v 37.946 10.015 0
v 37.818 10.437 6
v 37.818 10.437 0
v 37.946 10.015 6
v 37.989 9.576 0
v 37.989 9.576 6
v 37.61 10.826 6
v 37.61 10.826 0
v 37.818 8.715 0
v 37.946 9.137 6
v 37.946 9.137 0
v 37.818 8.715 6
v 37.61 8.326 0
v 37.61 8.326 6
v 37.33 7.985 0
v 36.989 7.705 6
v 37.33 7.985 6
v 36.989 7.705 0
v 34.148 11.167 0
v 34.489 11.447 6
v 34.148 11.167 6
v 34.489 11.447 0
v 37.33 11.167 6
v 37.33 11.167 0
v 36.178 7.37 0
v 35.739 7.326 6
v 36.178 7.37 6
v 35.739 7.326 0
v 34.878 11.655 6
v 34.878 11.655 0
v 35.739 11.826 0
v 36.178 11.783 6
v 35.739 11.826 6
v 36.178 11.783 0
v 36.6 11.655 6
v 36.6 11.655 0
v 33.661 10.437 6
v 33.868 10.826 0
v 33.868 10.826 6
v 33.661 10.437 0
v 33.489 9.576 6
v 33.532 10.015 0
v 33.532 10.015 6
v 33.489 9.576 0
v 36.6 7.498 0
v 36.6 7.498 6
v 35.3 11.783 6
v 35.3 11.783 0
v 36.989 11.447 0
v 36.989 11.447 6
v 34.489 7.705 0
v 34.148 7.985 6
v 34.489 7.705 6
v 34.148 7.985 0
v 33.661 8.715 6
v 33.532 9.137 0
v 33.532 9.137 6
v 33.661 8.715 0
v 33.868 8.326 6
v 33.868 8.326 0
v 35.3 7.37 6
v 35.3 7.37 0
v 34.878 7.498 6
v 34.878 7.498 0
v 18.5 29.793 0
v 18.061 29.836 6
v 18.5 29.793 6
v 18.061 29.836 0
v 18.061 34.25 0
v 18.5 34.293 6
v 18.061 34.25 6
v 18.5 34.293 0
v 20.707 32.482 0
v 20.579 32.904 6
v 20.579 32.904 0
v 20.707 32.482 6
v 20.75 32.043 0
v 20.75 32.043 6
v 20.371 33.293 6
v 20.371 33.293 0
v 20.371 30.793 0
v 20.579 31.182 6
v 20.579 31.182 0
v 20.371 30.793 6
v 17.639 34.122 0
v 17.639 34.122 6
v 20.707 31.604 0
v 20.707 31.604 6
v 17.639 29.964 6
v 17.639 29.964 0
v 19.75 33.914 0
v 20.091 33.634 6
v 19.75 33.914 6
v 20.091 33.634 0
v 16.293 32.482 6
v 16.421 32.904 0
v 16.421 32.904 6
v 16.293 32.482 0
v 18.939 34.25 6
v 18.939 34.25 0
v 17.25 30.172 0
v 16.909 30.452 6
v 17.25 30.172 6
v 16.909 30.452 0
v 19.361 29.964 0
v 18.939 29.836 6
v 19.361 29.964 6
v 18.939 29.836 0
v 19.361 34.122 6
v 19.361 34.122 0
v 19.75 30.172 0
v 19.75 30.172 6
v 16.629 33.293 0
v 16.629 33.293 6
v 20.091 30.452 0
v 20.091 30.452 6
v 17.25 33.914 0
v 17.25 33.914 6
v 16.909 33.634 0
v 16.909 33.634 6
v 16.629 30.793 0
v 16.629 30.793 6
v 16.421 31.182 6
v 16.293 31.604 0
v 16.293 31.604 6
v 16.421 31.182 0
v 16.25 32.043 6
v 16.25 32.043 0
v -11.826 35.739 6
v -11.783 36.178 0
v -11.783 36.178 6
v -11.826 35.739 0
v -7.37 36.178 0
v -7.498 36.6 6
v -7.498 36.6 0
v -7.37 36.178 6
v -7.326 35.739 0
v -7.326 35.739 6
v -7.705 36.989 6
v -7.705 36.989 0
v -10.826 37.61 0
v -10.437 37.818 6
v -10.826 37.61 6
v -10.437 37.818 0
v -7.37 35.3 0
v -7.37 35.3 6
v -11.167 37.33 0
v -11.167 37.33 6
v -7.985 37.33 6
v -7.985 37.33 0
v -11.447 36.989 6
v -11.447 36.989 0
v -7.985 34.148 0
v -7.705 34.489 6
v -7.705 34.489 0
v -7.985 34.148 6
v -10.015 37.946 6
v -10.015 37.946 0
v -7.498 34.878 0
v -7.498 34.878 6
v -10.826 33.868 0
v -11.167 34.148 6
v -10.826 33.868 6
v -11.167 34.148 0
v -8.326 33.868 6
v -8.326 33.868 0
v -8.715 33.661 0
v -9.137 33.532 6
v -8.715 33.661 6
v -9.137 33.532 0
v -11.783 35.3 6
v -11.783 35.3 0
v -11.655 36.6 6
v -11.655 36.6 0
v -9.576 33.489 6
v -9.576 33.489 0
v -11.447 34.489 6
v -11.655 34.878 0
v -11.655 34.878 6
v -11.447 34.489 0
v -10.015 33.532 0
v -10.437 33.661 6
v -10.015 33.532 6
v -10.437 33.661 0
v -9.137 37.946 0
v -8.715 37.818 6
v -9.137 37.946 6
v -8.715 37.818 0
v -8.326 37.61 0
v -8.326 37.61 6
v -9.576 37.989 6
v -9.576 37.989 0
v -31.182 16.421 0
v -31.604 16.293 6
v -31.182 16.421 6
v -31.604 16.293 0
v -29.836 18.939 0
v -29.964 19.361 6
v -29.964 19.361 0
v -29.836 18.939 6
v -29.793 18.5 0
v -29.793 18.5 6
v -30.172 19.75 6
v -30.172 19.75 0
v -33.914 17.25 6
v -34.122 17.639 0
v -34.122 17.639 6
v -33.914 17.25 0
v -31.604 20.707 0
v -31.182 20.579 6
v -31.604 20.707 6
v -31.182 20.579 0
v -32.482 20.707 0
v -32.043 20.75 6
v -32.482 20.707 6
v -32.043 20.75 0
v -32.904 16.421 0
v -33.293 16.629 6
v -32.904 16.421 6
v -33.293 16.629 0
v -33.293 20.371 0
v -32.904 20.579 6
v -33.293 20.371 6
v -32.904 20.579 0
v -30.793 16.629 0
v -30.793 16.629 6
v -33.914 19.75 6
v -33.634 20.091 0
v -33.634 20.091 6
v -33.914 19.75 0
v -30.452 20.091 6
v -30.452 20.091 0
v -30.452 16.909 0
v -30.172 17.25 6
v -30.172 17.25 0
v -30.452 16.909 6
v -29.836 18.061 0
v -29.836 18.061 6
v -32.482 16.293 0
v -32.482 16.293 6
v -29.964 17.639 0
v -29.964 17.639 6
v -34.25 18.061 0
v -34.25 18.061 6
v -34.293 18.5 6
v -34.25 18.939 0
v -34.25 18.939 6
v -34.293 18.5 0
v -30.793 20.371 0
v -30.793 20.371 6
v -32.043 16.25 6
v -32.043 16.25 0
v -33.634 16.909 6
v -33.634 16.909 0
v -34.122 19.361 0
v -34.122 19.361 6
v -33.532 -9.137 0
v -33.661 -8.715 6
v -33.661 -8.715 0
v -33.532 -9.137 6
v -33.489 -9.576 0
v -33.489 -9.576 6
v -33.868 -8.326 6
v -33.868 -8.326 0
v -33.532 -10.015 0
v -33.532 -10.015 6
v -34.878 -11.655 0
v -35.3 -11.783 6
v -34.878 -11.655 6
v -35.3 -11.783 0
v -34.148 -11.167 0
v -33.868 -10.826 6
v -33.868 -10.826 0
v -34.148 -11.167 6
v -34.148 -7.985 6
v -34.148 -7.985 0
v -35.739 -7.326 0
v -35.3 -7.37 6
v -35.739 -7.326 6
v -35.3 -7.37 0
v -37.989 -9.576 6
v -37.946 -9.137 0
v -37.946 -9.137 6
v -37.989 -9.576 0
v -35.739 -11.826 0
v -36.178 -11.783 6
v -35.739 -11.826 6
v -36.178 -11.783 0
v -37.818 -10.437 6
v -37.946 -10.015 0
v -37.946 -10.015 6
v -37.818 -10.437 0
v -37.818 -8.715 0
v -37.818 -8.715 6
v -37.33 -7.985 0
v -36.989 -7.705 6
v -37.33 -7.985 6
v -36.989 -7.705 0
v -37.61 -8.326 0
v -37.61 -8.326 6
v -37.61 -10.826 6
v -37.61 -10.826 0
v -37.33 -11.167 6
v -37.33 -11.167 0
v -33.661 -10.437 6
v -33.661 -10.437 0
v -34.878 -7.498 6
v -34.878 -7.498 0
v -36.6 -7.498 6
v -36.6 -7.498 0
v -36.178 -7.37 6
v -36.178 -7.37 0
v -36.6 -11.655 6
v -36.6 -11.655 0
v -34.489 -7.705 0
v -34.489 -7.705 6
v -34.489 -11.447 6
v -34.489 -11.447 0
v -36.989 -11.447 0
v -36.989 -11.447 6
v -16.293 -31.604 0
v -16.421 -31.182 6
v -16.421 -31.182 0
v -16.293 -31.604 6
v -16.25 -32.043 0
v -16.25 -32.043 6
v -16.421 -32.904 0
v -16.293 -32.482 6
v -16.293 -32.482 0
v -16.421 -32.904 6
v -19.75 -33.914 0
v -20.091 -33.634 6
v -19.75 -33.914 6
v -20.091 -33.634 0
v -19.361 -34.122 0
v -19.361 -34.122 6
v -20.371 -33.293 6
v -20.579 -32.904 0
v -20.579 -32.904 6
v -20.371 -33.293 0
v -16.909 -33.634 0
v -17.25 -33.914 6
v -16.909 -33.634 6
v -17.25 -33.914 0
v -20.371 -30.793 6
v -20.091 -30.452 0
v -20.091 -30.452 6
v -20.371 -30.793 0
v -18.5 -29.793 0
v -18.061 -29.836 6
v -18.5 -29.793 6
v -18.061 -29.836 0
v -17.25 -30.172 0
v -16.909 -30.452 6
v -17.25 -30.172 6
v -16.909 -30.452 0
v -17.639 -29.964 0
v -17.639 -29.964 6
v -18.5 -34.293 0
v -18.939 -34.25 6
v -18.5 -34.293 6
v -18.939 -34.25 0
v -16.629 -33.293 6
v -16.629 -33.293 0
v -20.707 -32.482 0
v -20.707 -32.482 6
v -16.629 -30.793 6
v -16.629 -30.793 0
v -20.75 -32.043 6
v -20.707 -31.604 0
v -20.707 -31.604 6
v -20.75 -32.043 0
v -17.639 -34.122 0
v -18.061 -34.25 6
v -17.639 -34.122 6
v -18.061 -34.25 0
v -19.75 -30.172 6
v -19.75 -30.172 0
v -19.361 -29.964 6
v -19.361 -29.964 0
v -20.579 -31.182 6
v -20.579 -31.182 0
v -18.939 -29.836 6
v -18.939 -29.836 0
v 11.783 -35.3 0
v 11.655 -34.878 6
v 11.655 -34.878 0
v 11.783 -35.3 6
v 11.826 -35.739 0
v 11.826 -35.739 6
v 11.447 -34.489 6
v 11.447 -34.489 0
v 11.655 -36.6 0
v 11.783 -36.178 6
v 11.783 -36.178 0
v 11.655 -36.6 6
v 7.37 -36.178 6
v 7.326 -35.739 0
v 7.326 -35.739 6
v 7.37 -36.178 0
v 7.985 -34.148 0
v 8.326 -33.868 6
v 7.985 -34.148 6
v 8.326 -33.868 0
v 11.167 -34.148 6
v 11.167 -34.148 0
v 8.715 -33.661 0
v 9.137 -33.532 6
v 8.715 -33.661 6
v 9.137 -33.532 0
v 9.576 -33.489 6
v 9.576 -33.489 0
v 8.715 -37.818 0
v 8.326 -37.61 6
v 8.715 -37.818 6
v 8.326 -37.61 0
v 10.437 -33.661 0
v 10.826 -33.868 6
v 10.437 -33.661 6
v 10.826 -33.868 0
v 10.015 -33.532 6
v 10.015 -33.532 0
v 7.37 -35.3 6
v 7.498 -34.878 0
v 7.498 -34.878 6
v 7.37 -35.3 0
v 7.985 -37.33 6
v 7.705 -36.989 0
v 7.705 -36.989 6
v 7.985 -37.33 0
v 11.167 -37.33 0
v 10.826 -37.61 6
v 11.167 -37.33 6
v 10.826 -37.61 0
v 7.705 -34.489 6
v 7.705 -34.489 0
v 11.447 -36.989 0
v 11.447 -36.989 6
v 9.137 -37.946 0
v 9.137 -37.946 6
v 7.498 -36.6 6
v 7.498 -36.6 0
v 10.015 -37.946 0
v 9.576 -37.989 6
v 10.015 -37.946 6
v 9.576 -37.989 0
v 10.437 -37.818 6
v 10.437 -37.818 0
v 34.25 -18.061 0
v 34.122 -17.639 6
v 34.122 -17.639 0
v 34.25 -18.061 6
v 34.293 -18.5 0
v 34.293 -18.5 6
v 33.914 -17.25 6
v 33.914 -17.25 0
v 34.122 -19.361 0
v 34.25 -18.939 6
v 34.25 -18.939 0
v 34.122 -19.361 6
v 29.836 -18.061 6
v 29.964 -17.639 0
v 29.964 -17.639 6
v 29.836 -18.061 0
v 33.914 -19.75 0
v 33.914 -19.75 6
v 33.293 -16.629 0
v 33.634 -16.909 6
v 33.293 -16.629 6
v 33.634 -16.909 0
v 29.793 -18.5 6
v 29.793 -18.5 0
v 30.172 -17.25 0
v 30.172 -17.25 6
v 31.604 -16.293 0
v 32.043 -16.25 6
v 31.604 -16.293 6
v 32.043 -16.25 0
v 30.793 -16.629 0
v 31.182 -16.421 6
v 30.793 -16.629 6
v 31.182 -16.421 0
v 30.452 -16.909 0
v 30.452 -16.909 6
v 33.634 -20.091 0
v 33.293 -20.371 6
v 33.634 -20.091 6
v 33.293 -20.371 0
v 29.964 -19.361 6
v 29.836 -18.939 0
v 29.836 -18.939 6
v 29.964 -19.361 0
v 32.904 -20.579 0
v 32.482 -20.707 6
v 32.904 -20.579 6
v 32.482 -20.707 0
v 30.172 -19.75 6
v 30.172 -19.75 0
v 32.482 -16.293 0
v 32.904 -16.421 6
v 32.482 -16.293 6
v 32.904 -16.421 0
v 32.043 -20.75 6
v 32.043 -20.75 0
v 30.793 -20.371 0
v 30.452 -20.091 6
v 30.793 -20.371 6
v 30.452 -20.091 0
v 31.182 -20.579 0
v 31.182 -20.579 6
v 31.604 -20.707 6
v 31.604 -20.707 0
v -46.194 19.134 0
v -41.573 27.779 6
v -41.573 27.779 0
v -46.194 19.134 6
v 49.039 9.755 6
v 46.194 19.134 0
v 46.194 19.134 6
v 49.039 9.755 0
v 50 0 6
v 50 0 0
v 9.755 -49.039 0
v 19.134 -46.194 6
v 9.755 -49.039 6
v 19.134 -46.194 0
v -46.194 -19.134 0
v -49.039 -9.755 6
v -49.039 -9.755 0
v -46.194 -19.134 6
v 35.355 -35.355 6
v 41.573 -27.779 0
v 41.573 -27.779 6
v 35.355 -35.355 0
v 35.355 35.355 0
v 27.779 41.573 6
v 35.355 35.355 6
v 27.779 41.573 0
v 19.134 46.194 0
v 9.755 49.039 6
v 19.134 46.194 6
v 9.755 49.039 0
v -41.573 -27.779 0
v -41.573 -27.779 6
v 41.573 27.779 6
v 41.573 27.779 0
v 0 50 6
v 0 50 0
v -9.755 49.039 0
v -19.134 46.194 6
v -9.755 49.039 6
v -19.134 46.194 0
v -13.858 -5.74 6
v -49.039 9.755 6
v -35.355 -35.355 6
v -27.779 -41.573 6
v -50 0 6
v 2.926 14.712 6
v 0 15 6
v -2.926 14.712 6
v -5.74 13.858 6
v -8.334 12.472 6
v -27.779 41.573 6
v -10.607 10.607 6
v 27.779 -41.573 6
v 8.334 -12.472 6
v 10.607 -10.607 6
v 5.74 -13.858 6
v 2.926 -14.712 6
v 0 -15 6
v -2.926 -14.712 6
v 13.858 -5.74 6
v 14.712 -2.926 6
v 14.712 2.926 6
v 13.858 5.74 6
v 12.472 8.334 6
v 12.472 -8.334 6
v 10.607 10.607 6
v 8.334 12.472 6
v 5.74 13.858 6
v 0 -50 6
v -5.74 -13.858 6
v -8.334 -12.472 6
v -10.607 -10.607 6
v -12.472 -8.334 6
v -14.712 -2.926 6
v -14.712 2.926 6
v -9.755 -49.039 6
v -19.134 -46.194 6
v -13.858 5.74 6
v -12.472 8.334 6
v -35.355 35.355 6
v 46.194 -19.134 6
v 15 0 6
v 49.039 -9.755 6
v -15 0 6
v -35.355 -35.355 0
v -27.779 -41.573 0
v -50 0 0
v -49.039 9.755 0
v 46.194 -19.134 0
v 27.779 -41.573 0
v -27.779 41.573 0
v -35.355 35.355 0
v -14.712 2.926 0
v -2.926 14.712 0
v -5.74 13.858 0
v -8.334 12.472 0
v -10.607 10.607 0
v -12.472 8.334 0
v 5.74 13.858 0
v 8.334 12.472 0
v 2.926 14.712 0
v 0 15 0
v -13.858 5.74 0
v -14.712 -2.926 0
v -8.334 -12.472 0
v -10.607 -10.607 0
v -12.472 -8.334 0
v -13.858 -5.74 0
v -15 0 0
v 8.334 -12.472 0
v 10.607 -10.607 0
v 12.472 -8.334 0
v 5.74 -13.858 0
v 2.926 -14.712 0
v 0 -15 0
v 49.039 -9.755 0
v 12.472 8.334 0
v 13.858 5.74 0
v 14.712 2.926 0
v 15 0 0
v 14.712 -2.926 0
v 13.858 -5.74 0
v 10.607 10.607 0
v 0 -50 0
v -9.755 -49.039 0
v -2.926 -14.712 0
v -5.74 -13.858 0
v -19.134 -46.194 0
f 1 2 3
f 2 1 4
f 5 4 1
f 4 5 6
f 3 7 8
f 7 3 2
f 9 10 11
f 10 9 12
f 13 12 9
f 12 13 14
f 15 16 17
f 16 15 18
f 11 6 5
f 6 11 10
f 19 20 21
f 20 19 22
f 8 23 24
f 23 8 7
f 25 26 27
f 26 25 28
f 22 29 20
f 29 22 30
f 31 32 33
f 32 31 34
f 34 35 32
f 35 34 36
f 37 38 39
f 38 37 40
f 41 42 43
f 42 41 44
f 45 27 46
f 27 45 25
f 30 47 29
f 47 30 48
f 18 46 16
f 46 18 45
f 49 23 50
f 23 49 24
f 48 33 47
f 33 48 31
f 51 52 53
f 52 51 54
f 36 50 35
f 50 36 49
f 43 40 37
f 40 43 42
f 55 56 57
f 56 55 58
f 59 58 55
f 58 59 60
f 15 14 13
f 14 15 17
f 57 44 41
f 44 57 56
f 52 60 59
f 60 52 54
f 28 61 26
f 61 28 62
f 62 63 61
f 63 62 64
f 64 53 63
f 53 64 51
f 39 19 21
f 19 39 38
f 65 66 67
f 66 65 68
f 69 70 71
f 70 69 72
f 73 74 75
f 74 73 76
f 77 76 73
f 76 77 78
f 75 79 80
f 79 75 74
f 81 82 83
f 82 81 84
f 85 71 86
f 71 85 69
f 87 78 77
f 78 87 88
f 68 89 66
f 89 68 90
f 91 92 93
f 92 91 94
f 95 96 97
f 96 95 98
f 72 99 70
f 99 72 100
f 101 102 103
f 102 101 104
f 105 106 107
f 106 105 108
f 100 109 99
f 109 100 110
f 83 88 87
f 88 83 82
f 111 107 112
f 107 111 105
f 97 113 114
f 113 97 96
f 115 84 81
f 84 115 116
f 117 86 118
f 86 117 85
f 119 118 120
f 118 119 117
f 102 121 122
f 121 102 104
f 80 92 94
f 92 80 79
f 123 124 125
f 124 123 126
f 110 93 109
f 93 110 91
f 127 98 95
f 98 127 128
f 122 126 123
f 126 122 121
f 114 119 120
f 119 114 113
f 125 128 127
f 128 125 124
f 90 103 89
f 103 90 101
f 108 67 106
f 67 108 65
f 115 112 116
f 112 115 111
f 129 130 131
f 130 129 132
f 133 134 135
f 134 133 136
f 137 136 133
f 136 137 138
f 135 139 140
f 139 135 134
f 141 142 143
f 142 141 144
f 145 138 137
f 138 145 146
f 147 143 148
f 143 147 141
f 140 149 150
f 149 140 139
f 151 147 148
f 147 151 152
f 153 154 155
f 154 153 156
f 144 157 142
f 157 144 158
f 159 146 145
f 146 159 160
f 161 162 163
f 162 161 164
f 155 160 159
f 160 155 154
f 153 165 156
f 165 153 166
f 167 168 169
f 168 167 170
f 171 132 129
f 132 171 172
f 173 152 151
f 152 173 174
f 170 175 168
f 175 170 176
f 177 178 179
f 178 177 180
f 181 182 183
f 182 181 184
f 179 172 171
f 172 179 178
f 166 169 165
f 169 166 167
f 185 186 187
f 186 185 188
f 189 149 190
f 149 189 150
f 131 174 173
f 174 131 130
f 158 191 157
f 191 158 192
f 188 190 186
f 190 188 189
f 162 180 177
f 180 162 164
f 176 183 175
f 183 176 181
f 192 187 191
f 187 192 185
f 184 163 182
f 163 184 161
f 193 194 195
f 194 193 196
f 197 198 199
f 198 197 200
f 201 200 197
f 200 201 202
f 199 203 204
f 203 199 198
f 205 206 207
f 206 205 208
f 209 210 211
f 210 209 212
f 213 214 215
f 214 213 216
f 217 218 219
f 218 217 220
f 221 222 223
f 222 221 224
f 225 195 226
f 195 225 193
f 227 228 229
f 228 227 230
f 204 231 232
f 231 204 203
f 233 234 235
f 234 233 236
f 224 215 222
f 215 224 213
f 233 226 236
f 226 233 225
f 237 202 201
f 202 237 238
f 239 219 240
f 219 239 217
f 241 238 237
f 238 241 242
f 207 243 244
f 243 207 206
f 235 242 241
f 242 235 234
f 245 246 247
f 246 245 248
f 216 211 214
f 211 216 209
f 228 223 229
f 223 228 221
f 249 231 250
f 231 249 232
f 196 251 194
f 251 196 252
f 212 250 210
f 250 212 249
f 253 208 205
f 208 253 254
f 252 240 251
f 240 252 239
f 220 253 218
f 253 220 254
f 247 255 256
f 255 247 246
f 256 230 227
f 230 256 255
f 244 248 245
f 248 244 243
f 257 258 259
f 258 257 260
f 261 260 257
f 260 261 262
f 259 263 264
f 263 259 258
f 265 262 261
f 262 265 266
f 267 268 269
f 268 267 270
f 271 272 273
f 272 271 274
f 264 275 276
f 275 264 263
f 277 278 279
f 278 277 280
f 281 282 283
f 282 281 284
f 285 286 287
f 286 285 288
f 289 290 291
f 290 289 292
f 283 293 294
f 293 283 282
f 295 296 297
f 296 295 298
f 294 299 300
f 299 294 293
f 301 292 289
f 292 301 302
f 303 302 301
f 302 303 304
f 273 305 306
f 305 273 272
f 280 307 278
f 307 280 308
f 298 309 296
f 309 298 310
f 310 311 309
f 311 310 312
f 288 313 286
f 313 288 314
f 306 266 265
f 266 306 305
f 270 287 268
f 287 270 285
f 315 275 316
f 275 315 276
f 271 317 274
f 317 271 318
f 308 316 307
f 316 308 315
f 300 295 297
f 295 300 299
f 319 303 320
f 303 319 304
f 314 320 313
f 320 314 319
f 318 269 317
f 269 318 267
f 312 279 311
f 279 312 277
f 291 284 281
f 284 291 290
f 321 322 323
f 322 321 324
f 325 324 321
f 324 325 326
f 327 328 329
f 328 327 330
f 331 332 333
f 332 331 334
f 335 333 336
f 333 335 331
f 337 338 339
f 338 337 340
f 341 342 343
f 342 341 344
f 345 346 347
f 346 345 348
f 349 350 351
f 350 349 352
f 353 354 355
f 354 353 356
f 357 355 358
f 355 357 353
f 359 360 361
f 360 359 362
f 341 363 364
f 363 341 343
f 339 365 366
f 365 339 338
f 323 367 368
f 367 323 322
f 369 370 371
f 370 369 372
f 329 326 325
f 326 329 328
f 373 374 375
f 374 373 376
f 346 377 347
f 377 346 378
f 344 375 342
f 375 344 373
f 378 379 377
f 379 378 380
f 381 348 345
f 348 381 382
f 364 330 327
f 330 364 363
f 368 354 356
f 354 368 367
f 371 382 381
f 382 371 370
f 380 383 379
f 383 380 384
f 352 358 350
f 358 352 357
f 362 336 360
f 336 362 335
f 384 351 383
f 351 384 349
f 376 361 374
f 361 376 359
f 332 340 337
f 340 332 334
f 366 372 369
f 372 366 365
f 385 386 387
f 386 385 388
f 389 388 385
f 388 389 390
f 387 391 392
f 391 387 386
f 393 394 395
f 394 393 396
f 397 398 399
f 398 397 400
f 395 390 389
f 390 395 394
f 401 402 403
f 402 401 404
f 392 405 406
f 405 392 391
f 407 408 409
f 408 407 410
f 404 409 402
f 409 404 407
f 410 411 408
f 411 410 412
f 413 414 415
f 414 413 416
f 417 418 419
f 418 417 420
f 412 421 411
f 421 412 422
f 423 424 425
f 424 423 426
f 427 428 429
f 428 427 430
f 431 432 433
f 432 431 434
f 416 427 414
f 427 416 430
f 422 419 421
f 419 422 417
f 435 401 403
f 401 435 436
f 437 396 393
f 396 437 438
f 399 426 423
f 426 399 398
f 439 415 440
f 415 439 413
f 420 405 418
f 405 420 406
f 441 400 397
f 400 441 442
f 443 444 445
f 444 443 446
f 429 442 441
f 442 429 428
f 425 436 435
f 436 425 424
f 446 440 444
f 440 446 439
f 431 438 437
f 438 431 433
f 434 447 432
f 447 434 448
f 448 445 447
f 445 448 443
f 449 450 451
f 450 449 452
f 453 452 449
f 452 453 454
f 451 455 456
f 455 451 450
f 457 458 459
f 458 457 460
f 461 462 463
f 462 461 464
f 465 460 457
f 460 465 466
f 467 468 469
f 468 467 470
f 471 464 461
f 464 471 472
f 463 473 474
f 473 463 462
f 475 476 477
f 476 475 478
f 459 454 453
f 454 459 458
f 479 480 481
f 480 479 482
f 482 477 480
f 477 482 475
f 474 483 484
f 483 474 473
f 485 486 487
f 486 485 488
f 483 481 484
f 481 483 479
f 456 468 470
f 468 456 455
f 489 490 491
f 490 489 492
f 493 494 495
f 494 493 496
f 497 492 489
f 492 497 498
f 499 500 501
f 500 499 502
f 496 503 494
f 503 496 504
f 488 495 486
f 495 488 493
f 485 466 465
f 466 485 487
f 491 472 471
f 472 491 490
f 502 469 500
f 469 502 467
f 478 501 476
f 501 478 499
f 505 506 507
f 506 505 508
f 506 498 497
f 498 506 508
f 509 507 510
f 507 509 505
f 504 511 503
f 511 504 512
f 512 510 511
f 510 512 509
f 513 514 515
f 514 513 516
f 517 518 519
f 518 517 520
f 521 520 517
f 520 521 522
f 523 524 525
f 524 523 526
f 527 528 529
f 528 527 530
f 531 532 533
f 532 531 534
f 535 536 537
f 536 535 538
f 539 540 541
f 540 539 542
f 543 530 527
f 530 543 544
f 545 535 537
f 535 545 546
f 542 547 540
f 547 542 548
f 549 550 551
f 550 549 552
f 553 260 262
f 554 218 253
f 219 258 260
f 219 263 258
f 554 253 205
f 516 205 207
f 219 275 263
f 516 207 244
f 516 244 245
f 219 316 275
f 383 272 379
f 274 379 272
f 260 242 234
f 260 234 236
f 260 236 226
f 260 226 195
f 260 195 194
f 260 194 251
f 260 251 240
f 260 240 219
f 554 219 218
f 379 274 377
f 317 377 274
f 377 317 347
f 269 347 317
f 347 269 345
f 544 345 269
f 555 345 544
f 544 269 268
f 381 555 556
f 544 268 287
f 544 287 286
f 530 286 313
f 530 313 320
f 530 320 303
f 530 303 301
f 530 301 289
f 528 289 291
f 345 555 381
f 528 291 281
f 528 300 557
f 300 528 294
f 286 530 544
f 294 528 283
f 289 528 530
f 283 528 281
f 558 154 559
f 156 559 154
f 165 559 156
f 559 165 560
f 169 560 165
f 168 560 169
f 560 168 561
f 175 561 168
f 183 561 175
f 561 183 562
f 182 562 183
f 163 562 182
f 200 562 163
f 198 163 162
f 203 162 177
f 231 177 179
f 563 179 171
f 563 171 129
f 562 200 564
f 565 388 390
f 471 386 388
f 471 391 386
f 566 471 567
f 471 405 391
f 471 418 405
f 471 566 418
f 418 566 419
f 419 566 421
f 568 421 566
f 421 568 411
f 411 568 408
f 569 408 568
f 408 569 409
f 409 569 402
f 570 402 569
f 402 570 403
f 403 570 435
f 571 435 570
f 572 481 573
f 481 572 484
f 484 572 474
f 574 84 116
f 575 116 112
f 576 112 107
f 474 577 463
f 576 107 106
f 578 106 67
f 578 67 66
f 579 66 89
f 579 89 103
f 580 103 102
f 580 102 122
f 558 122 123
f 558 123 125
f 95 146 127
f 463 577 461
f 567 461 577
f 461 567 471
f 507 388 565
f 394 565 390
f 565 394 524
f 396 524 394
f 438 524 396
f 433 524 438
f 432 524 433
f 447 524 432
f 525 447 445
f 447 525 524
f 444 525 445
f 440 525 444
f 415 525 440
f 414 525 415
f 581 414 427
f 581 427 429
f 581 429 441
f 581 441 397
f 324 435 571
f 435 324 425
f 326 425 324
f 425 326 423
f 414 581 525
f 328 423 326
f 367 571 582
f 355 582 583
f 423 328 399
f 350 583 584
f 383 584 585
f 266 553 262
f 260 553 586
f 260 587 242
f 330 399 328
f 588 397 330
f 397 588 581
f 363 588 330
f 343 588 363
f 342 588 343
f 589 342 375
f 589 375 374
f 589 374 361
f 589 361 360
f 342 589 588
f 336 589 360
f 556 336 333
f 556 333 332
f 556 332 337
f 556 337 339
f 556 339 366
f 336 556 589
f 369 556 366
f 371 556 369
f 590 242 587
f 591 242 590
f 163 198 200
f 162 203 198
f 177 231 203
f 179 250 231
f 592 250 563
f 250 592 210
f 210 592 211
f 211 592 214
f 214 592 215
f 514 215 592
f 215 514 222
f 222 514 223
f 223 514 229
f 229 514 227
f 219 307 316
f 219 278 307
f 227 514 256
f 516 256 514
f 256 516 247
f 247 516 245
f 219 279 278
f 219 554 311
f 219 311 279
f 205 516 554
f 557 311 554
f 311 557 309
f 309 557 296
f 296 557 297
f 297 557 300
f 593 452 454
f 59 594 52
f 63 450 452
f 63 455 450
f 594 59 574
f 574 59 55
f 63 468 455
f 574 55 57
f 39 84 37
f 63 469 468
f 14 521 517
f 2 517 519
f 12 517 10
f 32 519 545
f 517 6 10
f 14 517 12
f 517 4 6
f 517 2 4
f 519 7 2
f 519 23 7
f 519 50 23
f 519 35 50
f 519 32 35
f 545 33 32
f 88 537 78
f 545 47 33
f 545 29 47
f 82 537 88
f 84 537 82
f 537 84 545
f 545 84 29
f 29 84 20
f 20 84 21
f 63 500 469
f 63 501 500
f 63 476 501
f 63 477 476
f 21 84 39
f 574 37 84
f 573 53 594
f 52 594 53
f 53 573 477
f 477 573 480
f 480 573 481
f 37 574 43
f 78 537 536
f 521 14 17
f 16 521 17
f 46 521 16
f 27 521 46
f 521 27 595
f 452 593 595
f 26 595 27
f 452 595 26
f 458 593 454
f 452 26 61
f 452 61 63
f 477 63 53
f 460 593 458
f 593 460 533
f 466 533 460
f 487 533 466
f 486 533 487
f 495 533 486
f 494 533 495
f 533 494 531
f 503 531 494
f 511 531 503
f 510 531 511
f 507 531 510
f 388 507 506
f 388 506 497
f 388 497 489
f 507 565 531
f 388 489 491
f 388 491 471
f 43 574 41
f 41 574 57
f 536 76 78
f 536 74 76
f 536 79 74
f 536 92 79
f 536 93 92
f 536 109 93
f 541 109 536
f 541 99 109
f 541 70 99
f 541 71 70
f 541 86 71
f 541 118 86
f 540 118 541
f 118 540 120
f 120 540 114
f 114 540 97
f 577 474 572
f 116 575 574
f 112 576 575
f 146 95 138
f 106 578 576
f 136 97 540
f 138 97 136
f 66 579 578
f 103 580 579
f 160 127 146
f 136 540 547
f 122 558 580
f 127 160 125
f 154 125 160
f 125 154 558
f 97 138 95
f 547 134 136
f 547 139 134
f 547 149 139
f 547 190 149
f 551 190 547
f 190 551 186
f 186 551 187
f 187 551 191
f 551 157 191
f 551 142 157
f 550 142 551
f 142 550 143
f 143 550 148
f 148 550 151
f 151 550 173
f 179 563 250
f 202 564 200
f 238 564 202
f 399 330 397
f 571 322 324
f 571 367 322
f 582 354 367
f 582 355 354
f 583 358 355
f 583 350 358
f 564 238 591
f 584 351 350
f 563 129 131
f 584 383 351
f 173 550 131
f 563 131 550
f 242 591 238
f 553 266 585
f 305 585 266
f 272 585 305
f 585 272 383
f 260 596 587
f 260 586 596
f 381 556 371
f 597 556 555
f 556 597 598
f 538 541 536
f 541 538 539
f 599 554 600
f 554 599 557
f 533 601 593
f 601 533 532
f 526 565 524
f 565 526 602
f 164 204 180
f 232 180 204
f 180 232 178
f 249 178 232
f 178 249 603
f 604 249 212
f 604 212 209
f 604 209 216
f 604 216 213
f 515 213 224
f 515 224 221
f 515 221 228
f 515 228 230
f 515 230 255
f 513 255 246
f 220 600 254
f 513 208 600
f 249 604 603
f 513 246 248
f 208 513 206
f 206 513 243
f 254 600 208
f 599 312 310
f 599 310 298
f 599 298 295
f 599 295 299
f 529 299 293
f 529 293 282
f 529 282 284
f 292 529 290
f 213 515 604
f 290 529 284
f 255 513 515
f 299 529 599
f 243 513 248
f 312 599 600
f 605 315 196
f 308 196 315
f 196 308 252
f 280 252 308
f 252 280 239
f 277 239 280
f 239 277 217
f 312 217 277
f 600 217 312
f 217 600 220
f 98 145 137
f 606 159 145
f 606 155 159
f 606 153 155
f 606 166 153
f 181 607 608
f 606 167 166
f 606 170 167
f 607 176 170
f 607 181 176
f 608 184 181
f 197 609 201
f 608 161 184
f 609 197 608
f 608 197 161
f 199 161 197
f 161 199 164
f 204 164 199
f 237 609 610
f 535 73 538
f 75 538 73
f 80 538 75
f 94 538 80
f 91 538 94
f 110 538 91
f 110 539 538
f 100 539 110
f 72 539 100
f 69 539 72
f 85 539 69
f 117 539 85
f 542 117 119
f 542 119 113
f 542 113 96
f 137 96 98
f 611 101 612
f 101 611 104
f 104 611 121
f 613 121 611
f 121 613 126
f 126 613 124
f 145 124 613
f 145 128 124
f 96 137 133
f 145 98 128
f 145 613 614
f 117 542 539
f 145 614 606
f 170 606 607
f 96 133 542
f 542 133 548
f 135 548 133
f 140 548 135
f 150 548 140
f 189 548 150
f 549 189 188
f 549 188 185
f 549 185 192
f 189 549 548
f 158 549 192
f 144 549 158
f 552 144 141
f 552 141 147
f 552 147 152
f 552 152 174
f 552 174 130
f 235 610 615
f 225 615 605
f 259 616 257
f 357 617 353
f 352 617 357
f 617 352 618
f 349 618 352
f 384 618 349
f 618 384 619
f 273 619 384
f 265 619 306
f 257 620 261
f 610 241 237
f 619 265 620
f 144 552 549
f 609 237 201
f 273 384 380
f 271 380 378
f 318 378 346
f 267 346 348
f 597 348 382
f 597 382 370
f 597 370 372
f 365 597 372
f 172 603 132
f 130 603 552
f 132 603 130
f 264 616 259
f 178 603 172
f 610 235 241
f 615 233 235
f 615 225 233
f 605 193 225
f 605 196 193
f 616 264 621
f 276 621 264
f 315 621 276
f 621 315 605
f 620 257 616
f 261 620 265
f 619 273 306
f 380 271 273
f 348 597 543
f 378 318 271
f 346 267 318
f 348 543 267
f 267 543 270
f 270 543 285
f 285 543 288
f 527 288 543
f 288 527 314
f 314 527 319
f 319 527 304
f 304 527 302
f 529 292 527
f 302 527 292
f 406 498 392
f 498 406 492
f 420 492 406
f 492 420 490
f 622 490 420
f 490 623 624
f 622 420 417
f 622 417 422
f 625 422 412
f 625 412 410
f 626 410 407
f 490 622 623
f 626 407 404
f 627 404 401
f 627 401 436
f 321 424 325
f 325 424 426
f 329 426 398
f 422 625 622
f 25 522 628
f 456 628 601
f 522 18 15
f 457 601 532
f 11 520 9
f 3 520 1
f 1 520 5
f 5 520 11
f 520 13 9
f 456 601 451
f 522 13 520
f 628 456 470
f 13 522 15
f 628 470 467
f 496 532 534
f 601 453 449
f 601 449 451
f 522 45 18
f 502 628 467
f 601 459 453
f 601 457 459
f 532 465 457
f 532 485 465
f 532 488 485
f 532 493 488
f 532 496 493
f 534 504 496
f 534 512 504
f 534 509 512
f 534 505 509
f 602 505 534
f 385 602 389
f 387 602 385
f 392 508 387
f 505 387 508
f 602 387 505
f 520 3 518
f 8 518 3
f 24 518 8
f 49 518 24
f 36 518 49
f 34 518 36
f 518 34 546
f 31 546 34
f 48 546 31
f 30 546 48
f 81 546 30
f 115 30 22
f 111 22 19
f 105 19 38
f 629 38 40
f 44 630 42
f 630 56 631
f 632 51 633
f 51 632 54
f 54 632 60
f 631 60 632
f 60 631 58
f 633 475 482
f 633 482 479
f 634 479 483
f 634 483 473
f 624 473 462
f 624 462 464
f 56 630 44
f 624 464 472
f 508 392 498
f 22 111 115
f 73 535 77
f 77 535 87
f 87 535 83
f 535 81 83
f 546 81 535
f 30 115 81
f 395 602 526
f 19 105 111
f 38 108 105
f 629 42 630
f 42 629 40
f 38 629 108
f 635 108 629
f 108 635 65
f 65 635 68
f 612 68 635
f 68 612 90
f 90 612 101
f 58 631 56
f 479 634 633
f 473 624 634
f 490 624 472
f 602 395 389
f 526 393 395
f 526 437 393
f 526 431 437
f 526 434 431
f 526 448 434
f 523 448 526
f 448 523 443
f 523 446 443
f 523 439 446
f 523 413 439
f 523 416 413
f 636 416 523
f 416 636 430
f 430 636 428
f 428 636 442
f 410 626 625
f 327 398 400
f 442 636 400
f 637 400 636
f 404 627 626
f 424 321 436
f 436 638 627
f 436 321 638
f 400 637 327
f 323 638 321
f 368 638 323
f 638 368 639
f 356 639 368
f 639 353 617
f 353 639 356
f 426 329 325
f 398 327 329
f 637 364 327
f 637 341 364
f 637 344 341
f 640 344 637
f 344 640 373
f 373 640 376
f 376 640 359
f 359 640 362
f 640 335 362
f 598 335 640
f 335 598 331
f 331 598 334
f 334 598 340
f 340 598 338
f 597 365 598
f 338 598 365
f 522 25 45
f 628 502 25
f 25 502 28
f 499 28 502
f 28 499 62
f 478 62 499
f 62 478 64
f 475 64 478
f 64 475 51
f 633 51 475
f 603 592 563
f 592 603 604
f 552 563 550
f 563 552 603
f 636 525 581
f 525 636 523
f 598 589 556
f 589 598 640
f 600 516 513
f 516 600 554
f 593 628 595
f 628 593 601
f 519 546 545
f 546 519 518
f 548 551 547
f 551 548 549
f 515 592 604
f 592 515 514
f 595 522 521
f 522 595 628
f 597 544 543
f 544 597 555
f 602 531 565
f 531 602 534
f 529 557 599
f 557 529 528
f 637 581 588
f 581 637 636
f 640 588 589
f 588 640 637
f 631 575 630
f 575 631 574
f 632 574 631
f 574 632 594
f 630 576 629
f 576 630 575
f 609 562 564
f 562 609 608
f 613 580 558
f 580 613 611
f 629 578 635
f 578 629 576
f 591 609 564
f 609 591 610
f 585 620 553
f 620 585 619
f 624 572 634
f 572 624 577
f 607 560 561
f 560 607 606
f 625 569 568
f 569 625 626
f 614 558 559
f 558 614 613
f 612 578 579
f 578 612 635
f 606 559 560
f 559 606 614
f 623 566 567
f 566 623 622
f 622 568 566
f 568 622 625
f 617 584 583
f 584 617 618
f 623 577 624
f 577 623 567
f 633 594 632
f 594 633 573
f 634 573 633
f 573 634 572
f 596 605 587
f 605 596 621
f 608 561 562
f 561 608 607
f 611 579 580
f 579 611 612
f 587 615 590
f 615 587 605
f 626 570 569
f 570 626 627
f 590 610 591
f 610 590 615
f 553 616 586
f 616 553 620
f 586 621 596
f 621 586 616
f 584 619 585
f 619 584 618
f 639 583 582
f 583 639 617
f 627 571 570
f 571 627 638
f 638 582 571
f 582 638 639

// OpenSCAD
$fn = 32;

// ----------------------------------------------------------------------
// Flange Ø100 x 6
// 8 holes on a Ø74 bolt circle, bolted joints
// ----------------------------------------------------------------------

// --- parameters (mm) ---
flange_d = 100;  // outside diameter of the flange
thickness = 6;   // flange thickness
holes = 8;       // number of bolt holes
pcd = 74;        // bolt circle diameter
start_deg = 15;  // angle of the first hole, from +X
hole_d = 4.5;    // bolt hole diameter
bore_d = 30;     // central through bore
hub_d = 38;      // hub outside diameter
hub_h = 0;       // hub height above the flange face (0 = no hub)

// --- derived feature positions (mm) ---
height = thickness + hub_h;  // = 6   overall height of the part
pcd_r = pcd / 2;             // = 37   bolt circle radius
hole_step = 360 / holes;     // = 45   angular pitch
feature_centers = [
  [pcd_r * cos(start_deg + 0 * hole_step), pcd_r * sin(start_deg + 0 * hole_step)],
  [pcd_r * cos(start_deg + 1 * hole_step), pcd_r * sin(start_deg + 1 * hole_step)],
  [pcd_r * cos(start_deg + 2 * hole_step), pcd_r * sin(start_deg + 2 * hole_step)],
  [pcd_r * cos(start_deg + 3 * hole_step), pcd_r * sin(start_deg + 3 * hole_step)],
  [pcd_r * cos(start_deg + 4 * hole_step), pcd_r * sin(start_deg + 4 * hole_step)],
  [pcd_r * cos(start_deg + 5 * hole_step), pcd_r * sin(start_deg + 5 * hole_step)],
  [pcd_r * cos(start_deg + 6 * hole_step), pcd_r * sin(start_deg + 6 * hole_step)],
  [pcd_r * cos(start_deg + 7 * hole_step), pcd_r * sin(start_deg + 7 * hole_step)]
];   // bolt hole centres on the pitch circle

// flange disc, every hole and the bore cut straight through
difference() {
  union() {
    cylinder(d = flange_d, h = thickness);
  }
  translate([0, 0, -1]) cylinder(d = bore_d, h = height + 2);  // bore, through
  for (centre = feature_centers)
    translate([centre[0], centre[1], -1]) cylinder(d = hole_d, h = thickness + 2);
}
